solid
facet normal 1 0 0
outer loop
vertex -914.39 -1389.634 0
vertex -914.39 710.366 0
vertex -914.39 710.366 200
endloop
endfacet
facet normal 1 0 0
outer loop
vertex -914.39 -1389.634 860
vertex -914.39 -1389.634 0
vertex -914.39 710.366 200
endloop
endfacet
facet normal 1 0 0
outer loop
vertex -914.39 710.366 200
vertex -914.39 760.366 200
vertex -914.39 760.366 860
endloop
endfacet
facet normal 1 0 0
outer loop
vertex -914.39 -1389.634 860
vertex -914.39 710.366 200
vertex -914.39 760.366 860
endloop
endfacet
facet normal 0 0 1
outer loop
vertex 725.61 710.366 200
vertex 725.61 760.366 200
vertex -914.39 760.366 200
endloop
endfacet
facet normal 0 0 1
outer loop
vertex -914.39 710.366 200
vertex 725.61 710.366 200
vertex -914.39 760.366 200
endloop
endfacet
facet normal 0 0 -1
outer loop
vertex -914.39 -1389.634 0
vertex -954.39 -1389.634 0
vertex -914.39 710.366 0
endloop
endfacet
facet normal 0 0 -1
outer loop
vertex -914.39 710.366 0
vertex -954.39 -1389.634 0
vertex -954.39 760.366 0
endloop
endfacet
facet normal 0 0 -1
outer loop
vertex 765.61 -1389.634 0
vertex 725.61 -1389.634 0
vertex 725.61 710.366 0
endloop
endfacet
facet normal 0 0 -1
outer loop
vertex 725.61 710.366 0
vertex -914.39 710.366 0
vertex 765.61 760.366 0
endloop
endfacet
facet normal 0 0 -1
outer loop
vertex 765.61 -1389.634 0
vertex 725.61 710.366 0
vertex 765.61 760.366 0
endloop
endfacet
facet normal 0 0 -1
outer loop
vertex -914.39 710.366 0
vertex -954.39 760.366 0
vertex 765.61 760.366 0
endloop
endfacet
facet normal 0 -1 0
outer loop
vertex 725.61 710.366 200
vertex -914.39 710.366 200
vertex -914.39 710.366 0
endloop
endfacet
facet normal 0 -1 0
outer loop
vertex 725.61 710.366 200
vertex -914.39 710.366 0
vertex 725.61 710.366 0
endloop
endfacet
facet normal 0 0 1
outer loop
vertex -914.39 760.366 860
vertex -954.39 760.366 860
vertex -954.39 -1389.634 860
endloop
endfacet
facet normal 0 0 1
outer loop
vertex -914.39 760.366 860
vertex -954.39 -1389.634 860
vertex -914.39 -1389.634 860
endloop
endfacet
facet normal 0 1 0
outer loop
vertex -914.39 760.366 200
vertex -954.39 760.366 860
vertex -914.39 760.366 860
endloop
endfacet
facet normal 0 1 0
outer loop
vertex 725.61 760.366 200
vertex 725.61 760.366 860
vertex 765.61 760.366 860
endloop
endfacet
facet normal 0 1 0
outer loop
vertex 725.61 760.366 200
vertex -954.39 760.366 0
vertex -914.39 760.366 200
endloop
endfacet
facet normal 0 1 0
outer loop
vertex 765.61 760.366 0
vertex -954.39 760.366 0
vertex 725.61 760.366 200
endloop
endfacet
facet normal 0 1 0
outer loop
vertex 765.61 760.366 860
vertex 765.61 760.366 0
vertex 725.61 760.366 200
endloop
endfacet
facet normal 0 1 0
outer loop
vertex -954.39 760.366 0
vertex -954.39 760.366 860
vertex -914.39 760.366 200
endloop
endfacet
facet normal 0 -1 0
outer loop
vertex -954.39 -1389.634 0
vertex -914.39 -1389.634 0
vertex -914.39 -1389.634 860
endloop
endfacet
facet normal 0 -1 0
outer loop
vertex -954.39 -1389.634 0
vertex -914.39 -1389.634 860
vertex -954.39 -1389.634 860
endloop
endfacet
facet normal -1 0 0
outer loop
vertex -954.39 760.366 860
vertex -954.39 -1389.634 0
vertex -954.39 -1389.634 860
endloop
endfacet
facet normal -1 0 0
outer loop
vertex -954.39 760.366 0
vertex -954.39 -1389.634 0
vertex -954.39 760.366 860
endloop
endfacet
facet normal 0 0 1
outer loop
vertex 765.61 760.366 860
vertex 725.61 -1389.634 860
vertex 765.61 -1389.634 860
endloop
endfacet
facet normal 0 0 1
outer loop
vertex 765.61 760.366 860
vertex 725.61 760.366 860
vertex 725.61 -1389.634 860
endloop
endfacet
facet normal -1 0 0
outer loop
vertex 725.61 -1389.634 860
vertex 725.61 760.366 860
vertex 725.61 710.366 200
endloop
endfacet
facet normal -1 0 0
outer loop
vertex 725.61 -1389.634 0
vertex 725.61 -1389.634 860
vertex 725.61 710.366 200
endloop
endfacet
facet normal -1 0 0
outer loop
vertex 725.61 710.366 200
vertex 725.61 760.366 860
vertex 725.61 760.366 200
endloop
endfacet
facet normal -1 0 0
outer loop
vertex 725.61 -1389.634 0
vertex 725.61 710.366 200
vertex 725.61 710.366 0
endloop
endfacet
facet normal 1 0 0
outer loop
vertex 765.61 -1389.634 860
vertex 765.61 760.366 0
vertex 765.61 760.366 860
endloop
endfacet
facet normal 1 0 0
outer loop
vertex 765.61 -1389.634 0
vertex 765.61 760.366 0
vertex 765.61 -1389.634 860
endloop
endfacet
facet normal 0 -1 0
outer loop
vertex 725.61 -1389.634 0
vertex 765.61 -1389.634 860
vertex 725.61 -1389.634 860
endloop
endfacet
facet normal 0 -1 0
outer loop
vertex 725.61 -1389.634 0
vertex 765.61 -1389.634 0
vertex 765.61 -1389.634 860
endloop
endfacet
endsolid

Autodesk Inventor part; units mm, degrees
ref_plane "YZ Plane" through (0, 0, 0) normal (1, 0, 0) x (0, 1, 0)
ref_plane "XZ Plane" through (0, 0, 0) normal (0, 1, 0) x (-1, 0, 0)
ref_plane "XY Plane" through (0, 0, 0) normal (0, 0, 1) x (1, 0, 0)
sketch "Esquisse1" plane through (0, 0, 0) normal (0, 0, 1) x (1, 0, 0)
  line L0 (-954.3902, 760.3659) -> (765.6098, 760.3659)
  line L1 (765.6098, 760.3659) -> (765.6098, -1389.6341)
  line L2 (765.6098, -1389.6341) -> (-954.3902, -1389.6341)
  line L3 (-954.3902, -1389.6341) -> (-954.3902, 760.3659)
  point P0 (0, 0)
  dimension "d0" = 1720
  dimension "d1" = 2150
extrude "Extrusion1" add sketch "Esquisse1" along normal blind 860
sketch "Esquisse2" plane through (-954.3902, 760.3659, 0) normal (0, 1, 0) x (1, 0, 0)
  line L0 (1720, -860) -> (0, -860) projected
  line L1 (40, -860) -> (1680, -860)
  line L2 (1680, -860) -> (1680, -200)
  line L3 (1680, -200) -> (40, -200)
  line L4 (40, -200) -> (40, -860)
  line L5 (0, 0) -> (1720, 0) projected
  point P0 (954.3902, 0)
  dimension "d4" = 40
  dimension "d5" = 40
  dimension "d6" = 200
extrude "Extrusion2" cut sketch "Esquisse2" against normal through all
sketch "Esquisse3" plane through (-914.3902, 760.3659, 200) normal (0, 0, 1) x (1, 0, 0)
  line L0 (0, -2150) -> (0, 0) projected
  line L1 (1640, 0) -> (1640, -2150) projected
  line L2 (0, -50) -> (1640, -50)
  line L3 (1640, -50) -> (1640, -2150)
  line L4 (1640, -2150) -> (0, -2150)
  line L5 (0, -2150) -> (0, -50)
  line L6 (0, 0) -> (1640, 0) projected
  point P0 (914.3902, -760.3659)
  dimension "d9" = 50
extrude "Extrusion3" cut sketch "Esquisse3" against normal blind 1000 contours L0 L2 L1 L4
properties part number "Porte Double" material "Bois (Chêne)"
